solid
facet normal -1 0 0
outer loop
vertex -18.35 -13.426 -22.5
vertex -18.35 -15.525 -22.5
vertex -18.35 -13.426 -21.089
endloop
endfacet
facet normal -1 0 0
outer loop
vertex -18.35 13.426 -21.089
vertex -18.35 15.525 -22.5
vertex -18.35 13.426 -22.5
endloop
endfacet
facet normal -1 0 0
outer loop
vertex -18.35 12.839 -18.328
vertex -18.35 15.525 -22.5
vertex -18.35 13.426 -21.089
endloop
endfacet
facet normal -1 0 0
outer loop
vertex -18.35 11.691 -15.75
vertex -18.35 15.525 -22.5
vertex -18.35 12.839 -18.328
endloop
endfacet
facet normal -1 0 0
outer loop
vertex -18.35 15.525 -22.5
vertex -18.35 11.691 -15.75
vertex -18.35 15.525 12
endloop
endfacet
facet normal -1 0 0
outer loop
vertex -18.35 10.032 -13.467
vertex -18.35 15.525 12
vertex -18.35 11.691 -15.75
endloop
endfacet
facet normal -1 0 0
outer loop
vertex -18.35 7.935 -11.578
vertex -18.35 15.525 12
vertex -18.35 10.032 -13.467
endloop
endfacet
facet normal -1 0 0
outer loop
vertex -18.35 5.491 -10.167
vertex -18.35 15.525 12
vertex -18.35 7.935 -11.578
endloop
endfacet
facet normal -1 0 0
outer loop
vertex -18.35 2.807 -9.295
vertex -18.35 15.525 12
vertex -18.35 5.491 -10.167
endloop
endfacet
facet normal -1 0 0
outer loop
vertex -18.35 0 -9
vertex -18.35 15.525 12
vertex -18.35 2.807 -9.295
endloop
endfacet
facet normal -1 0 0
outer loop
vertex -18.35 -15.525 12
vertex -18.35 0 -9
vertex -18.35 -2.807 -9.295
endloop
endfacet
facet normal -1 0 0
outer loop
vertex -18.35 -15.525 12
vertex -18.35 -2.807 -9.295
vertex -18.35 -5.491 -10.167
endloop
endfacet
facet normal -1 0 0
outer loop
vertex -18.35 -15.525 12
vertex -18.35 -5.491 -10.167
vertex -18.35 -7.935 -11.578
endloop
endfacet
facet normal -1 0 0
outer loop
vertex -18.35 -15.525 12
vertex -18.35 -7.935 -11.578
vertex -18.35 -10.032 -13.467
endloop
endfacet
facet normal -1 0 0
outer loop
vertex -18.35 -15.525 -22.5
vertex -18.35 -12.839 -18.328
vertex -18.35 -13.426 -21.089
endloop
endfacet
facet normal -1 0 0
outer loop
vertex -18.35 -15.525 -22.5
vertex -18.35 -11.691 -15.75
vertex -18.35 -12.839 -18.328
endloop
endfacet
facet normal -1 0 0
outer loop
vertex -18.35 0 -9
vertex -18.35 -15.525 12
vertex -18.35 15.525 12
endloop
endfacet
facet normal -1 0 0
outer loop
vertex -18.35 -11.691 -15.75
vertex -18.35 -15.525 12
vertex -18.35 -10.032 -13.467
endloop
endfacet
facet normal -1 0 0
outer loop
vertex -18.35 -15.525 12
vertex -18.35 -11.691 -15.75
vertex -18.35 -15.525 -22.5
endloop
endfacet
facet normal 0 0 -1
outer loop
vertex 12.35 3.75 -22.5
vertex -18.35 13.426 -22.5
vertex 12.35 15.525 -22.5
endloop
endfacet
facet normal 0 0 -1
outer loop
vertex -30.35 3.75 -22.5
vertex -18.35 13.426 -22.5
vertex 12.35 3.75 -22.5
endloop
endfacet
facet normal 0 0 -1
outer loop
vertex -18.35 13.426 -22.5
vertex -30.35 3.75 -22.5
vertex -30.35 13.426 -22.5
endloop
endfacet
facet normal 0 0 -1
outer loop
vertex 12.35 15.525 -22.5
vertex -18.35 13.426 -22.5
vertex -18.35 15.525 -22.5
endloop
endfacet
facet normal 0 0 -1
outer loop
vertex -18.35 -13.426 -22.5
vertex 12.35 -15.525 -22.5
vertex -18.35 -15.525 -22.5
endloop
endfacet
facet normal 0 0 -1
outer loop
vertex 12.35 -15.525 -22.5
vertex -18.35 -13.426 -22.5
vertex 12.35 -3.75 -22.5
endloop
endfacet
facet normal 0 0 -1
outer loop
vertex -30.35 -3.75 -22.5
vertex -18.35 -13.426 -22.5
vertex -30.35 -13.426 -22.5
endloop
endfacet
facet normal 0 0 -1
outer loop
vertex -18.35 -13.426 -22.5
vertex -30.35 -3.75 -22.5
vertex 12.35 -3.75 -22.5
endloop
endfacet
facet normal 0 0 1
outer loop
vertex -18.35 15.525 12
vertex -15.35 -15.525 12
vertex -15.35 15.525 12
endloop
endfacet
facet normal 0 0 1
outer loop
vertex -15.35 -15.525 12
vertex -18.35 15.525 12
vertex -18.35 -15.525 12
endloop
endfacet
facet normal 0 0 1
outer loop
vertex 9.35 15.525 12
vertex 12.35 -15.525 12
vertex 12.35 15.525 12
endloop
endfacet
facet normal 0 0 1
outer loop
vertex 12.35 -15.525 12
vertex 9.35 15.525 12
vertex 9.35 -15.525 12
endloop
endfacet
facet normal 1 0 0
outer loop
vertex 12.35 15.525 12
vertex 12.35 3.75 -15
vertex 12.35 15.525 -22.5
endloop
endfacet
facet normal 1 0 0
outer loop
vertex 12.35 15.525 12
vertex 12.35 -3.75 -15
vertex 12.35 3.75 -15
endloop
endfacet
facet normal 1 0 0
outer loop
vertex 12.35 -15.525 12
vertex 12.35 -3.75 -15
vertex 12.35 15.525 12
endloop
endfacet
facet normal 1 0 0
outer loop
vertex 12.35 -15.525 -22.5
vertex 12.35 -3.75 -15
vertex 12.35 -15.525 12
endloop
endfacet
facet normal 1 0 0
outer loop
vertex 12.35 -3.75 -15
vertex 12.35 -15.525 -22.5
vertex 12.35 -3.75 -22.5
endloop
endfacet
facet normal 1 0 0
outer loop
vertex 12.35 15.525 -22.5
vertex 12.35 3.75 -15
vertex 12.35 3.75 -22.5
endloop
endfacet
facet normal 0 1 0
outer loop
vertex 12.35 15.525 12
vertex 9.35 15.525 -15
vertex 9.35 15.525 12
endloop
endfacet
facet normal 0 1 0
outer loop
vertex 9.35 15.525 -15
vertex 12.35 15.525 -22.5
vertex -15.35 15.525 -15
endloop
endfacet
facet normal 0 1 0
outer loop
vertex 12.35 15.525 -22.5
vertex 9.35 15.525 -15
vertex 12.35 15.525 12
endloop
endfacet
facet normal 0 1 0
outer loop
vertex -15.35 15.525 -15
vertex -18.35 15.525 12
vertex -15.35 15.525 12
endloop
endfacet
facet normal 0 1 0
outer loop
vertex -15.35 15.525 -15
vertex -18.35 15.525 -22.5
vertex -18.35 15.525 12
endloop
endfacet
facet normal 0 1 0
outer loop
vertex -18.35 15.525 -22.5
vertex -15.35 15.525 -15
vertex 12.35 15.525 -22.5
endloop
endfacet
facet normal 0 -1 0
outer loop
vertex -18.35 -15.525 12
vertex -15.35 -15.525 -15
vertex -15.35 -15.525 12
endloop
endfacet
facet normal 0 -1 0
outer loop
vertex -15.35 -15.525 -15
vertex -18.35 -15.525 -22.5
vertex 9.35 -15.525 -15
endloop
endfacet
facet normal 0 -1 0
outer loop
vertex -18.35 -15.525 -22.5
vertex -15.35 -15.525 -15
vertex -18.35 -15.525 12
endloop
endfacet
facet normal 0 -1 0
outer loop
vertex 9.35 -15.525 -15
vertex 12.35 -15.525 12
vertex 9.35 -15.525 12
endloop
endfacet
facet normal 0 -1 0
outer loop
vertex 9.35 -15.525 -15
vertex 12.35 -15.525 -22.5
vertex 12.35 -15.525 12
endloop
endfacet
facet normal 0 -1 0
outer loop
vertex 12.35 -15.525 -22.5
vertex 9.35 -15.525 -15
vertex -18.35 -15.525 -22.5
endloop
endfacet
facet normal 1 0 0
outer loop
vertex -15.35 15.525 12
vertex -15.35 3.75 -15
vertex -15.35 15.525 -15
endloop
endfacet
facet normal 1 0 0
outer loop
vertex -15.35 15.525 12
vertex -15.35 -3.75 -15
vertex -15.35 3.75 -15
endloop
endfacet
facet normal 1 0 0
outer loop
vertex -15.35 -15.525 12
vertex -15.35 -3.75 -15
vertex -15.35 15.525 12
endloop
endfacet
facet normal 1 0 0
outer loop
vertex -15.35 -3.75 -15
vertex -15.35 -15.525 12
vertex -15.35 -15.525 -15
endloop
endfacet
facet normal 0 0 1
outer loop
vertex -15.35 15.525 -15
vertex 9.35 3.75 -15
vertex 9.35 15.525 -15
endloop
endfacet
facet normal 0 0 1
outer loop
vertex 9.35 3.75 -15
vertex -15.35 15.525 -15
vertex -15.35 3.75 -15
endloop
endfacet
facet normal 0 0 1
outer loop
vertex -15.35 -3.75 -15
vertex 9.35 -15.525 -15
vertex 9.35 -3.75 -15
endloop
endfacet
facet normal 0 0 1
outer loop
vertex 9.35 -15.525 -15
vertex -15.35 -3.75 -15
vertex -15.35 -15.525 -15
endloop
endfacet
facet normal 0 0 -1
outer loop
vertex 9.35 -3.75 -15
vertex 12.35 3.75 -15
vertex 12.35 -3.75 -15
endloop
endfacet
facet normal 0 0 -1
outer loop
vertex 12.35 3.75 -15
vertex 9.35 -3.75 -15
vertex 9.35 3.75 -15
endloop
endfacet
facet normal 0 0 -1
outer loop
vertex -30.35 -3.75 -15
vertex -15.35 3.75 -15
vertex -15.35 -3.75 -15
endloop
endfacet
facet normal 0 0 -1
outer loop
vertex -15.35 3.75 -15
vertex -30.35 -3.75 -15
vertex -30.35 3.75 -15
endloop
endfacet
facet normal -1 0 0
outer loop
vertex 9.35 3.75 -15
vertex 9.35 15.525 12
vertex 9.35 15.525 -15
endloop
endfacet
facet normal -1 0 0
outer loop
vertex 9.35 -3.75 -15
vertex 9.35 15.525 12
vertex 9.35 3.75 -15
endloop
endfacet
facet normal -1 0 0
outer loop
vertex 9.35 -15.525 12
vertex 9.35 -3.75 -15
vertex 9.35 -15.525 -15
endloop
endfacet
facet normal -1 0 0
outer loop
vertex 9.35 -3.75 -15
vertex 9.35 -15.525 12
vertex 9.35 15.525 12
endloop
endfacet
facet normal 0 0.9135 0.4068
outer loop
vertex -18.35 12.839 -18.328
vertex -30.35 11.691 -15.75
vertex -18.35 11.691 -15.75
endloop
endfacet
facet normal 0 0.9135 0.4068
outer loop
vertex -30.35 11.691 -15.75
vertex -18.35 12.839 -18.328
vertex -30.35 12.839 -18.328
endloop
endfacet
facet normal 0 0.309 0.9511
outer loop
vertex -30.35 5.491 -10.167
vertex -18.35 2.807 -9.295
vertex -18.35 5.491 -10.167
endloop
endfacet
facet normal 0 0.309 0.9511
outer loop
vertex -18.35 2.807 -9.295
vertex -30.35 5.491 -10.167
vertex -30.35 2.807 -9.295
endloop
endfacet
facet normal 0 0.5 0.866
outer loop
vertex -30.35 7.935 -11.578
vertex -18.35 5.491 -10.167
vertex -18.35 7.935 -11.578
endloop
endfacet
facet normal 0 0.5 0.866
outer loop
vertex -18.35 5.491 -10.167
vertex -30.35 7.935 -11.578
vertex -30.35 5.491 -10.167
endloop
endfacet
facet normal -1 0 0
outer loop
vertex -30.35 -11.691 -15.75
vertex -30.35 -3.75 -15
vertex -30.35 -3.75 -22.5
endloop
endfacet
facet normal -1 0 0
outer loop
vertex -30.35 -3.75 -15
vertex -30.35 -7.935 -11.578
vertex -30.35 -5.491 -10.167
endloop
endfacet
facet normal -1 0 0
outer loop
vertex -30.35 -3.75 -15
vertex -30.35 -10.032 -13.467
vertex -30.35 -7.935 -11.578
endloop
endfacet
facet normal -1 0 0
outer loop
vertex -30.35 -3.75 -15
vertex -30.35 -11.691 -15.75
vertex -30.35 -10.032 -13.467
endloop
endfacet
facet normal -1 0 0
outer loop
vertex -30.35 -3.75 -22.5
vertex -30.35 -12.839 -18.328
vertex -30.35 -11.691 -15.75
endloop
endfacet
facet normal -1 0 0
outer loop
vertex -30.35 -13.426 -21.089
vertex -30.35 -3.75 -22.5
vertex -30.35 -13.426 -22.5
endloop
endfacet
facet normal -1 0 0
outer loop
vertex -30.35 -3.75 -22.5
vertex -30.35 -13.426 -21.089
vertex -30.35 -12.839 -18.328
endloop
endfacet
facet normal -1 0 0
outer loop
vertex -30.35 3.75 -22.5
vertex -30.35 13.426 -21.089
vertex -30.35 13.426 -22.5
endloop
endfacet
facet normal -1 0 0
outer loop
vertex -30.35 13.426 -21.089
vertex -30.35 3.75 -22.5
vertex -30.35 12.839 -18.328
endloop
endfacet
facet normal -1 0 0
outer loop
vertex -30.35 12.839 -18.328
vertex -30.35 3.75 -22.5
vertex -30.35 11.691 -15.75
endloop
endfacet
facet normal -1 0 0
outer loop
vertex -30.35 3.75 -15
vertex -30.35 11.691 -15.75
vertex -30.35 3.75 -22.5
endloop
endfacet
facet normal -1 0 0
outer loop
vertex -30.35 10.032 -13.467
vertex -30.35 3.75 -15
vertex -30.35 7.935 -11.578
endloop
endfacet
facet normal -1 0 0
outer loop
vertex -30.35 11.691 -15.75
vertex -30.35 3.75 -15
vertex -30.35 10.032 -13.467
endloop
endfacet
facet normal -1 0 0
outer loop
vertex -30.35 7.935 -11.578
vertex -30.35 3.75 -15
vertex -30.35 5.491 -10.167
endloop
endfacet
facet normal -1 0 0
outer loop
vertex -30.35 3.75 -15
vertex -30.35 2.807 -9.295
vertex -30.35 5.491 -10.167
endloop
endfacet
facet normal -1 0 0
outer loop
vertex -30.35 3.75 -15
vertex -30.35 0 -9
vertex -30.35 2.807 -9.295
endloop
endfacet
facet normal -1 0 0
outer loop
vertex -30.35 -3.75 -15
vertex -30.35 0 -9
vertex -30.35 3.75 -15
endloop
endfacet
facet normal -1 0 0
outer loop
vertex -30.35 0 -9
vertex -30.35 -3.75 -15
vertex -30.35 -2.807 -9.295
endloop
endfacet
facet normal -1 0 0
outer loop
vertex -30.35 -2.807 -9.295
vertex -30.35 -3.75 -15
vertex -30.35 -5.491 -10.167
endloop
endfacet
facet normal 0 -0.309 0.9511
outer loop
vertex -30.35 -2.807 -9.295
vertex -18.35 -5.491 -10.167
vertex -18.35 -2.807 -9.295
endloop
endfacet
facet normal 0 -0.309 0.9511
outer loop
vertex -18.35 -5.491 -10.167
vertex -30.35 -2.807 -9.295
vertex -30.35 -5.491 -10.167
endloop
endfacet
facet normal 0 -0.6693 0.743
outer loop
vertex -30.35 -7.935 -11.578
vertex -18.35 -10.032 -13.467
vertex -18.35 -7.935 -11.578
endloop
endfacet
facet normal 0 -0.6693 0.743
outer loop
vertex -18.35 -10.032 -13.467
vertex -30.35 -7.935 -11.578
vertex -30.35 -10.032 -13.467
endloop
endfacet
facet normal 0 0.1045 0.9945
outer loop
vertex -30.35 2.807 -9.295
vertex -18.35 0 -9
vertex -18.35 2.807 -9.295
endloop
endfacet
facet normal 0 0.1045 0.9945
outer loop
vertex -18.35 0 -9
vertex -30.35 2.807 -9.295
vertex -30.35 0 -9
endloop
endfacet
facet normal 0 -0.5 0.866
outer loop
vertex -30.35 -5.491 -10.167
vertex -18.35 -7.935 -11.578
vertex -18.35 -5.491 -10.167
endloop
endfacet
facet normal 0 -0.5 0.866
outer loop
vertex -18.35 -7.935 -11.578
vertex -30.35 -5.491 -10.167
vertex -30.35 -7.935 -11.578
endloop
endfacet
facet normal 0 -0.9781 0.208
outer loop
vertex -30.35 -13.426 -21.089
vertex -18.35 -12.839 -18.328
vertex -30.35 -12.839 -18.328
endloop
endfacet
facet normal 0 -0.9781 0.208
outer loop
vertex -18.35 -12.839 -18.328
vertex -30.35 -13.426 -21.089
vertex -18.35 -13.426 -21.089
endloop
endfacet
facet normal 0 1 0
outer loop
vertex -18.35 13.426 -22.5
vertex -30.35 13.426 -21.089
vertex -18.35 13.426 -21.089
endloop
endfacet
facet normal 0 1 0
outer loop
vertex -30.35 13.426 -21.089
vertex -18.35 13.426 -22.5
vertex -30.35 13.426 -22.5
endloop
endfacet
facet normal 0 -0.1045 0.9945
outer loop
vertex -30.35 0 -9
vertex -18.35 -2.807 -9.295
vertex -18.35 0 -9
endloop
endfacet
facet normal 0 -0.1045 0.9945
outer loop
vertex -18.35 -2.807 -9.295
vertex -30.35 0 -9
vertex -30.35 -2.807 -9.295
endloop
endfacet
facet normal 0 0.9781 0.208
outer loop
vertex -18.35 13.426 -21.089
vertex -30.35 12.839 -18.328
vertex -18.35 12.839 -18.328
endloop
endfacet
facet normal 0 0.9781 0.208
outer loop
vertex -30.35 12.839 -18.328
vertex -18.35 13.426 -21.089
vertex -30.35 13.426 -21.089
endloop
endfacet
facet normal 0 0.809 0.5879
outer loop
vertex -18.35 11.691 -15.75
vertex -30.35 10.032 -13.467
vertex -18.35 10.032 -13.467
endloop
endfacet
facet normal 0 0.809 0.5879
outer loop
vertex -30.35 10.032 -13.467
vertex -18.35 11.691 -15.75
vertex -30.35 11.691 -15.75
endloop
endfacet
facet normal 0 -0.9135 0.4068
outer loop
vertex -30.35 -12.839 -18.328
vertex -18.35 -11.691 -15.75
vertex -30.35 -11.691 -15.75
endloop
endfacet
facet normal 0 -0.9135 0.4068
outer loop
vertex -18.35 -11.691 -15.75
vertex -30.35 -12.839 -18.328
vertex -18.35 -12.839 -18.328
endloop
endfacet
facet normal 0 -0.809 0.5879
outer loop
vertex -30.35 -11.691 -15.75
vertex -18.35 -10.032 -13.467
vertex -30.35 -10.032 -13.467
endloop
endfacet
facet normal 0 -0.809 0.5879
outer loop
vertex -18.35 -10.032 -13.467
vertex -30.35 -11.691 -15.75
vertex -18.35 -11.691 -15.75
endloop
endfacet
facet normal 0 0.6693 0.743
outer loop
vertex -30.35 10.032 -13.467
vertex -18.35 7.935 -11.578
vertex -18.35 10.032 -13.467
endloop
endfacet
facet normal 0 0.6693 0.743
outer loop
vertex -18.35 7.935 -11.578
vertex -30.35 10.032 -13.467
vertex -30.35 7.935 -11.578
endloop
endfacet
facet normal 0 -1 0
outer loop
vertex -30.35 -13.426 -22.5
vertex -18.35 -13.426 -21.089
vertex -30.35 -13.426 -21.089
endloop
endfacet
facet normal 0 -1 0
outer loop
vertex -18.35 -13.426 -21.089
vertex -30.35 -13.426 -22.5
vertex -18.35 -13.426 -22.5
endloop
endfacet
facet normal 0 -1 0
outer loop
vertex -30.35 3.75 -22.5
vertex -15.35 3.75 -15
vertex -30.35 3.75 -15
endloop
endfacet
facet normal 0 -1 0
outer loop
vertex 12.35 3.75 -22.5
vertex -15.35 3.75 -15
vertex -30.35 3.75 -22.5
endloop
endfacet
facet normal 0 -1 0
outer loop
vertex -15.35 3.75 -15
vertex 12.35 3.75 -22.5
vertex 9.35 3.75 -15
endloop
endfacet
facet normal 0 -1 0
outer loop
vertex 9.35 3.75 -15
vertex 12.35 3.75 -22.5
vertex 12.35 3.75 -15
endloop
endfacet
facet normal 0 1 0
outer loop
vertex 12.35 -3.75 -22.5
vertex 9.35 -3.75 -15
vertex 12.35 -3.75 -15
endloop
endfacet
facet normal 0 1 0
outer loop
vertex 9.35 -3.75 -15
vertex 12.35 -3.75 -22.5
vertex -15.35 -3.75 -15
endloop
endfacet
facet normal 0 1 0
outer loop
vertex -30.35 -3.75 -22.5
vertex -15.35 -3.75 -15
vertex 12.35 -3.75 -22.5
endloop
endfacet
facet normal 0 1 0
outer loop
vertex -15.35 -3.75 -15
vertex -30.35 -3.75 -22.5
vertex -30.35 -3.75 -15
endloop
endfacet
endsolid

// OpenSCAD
// Cable Holder by xifle
// 05.03.2017
// v3

// preview[view:north, tilt:top diagonal]
/* [Parameters] */

// The thickness of the table (mm)
TABLE_HEIGHT = 24.7;

// The depth of the cable holder (mm)
DEPTH = 30;

// diameter of the cable to hold, some space will be added (mm)
CABLE = 6;

// height of the cylinder on top of the cable holder clip (mm)
CYLINDER_HEIGHT = 12;

// wall thickness (mm)
WALL = 3; 

// space between table and wall, this will be at least the thickness of the cable (plus 1.5mm spacing) (mm)
WALLTABLESPACE = 3;

/* [Hidden] */

// additional space for cable
CABLEWSPACE = CABLE+1.5;

$fs = 0.01;
ADDSPACE = max(max(WALLTABLESPACE,CABLEWSPACE),WALL)-WALL;

//ADDSPACE = WALLTABLESPACE-WALL;
OUTER_RADIUS = CABLEWSPACE*1.8;
WIDTH = OUTER_RADIUS*2.3;

rotate([0,180,0])
difference() {
union() {

	translate([TABLE_HEIGHT/2+2*WALL+CYLINDER_HEIGHT/2,0,DEPTH/2+WALL+ADDSPACE])
	rotate([0,90,0])
	cylinder(h=CYLINDER_HEIGHT, r=OUTER_RADIUS, center=true);


	difference() {

	translate([WALL,0,WALL+ADDSPACE/2])
	cube([TABLE_HEIGHT+2*WALL, WIDTH, DEPTH+ADDSPACE ], center=true);

	translate([WALL, WALL,0])
	cube([TABLE_HEIGHT, WIDTH*2, DEPTH], center=true);

	}

}

translate([0,0,DEPTH/2+WALL+OUTER_RADIUS+ADDSPACE])
cube([(TABLE_HEIGHT+2*WALL+CYLINDER_HEIGHT)*2, WIDTH, 2*OUTER_RADIUS], center=true);

translate([0,0,DEPTH/2+WALL+ADDSPACE])
cube([(TABLE_HEIGHT+2*WALL+CYLINDER_HEIGHT)*2, CABLEWSPACE, CABLEWSPACE*2], center=true);

}
